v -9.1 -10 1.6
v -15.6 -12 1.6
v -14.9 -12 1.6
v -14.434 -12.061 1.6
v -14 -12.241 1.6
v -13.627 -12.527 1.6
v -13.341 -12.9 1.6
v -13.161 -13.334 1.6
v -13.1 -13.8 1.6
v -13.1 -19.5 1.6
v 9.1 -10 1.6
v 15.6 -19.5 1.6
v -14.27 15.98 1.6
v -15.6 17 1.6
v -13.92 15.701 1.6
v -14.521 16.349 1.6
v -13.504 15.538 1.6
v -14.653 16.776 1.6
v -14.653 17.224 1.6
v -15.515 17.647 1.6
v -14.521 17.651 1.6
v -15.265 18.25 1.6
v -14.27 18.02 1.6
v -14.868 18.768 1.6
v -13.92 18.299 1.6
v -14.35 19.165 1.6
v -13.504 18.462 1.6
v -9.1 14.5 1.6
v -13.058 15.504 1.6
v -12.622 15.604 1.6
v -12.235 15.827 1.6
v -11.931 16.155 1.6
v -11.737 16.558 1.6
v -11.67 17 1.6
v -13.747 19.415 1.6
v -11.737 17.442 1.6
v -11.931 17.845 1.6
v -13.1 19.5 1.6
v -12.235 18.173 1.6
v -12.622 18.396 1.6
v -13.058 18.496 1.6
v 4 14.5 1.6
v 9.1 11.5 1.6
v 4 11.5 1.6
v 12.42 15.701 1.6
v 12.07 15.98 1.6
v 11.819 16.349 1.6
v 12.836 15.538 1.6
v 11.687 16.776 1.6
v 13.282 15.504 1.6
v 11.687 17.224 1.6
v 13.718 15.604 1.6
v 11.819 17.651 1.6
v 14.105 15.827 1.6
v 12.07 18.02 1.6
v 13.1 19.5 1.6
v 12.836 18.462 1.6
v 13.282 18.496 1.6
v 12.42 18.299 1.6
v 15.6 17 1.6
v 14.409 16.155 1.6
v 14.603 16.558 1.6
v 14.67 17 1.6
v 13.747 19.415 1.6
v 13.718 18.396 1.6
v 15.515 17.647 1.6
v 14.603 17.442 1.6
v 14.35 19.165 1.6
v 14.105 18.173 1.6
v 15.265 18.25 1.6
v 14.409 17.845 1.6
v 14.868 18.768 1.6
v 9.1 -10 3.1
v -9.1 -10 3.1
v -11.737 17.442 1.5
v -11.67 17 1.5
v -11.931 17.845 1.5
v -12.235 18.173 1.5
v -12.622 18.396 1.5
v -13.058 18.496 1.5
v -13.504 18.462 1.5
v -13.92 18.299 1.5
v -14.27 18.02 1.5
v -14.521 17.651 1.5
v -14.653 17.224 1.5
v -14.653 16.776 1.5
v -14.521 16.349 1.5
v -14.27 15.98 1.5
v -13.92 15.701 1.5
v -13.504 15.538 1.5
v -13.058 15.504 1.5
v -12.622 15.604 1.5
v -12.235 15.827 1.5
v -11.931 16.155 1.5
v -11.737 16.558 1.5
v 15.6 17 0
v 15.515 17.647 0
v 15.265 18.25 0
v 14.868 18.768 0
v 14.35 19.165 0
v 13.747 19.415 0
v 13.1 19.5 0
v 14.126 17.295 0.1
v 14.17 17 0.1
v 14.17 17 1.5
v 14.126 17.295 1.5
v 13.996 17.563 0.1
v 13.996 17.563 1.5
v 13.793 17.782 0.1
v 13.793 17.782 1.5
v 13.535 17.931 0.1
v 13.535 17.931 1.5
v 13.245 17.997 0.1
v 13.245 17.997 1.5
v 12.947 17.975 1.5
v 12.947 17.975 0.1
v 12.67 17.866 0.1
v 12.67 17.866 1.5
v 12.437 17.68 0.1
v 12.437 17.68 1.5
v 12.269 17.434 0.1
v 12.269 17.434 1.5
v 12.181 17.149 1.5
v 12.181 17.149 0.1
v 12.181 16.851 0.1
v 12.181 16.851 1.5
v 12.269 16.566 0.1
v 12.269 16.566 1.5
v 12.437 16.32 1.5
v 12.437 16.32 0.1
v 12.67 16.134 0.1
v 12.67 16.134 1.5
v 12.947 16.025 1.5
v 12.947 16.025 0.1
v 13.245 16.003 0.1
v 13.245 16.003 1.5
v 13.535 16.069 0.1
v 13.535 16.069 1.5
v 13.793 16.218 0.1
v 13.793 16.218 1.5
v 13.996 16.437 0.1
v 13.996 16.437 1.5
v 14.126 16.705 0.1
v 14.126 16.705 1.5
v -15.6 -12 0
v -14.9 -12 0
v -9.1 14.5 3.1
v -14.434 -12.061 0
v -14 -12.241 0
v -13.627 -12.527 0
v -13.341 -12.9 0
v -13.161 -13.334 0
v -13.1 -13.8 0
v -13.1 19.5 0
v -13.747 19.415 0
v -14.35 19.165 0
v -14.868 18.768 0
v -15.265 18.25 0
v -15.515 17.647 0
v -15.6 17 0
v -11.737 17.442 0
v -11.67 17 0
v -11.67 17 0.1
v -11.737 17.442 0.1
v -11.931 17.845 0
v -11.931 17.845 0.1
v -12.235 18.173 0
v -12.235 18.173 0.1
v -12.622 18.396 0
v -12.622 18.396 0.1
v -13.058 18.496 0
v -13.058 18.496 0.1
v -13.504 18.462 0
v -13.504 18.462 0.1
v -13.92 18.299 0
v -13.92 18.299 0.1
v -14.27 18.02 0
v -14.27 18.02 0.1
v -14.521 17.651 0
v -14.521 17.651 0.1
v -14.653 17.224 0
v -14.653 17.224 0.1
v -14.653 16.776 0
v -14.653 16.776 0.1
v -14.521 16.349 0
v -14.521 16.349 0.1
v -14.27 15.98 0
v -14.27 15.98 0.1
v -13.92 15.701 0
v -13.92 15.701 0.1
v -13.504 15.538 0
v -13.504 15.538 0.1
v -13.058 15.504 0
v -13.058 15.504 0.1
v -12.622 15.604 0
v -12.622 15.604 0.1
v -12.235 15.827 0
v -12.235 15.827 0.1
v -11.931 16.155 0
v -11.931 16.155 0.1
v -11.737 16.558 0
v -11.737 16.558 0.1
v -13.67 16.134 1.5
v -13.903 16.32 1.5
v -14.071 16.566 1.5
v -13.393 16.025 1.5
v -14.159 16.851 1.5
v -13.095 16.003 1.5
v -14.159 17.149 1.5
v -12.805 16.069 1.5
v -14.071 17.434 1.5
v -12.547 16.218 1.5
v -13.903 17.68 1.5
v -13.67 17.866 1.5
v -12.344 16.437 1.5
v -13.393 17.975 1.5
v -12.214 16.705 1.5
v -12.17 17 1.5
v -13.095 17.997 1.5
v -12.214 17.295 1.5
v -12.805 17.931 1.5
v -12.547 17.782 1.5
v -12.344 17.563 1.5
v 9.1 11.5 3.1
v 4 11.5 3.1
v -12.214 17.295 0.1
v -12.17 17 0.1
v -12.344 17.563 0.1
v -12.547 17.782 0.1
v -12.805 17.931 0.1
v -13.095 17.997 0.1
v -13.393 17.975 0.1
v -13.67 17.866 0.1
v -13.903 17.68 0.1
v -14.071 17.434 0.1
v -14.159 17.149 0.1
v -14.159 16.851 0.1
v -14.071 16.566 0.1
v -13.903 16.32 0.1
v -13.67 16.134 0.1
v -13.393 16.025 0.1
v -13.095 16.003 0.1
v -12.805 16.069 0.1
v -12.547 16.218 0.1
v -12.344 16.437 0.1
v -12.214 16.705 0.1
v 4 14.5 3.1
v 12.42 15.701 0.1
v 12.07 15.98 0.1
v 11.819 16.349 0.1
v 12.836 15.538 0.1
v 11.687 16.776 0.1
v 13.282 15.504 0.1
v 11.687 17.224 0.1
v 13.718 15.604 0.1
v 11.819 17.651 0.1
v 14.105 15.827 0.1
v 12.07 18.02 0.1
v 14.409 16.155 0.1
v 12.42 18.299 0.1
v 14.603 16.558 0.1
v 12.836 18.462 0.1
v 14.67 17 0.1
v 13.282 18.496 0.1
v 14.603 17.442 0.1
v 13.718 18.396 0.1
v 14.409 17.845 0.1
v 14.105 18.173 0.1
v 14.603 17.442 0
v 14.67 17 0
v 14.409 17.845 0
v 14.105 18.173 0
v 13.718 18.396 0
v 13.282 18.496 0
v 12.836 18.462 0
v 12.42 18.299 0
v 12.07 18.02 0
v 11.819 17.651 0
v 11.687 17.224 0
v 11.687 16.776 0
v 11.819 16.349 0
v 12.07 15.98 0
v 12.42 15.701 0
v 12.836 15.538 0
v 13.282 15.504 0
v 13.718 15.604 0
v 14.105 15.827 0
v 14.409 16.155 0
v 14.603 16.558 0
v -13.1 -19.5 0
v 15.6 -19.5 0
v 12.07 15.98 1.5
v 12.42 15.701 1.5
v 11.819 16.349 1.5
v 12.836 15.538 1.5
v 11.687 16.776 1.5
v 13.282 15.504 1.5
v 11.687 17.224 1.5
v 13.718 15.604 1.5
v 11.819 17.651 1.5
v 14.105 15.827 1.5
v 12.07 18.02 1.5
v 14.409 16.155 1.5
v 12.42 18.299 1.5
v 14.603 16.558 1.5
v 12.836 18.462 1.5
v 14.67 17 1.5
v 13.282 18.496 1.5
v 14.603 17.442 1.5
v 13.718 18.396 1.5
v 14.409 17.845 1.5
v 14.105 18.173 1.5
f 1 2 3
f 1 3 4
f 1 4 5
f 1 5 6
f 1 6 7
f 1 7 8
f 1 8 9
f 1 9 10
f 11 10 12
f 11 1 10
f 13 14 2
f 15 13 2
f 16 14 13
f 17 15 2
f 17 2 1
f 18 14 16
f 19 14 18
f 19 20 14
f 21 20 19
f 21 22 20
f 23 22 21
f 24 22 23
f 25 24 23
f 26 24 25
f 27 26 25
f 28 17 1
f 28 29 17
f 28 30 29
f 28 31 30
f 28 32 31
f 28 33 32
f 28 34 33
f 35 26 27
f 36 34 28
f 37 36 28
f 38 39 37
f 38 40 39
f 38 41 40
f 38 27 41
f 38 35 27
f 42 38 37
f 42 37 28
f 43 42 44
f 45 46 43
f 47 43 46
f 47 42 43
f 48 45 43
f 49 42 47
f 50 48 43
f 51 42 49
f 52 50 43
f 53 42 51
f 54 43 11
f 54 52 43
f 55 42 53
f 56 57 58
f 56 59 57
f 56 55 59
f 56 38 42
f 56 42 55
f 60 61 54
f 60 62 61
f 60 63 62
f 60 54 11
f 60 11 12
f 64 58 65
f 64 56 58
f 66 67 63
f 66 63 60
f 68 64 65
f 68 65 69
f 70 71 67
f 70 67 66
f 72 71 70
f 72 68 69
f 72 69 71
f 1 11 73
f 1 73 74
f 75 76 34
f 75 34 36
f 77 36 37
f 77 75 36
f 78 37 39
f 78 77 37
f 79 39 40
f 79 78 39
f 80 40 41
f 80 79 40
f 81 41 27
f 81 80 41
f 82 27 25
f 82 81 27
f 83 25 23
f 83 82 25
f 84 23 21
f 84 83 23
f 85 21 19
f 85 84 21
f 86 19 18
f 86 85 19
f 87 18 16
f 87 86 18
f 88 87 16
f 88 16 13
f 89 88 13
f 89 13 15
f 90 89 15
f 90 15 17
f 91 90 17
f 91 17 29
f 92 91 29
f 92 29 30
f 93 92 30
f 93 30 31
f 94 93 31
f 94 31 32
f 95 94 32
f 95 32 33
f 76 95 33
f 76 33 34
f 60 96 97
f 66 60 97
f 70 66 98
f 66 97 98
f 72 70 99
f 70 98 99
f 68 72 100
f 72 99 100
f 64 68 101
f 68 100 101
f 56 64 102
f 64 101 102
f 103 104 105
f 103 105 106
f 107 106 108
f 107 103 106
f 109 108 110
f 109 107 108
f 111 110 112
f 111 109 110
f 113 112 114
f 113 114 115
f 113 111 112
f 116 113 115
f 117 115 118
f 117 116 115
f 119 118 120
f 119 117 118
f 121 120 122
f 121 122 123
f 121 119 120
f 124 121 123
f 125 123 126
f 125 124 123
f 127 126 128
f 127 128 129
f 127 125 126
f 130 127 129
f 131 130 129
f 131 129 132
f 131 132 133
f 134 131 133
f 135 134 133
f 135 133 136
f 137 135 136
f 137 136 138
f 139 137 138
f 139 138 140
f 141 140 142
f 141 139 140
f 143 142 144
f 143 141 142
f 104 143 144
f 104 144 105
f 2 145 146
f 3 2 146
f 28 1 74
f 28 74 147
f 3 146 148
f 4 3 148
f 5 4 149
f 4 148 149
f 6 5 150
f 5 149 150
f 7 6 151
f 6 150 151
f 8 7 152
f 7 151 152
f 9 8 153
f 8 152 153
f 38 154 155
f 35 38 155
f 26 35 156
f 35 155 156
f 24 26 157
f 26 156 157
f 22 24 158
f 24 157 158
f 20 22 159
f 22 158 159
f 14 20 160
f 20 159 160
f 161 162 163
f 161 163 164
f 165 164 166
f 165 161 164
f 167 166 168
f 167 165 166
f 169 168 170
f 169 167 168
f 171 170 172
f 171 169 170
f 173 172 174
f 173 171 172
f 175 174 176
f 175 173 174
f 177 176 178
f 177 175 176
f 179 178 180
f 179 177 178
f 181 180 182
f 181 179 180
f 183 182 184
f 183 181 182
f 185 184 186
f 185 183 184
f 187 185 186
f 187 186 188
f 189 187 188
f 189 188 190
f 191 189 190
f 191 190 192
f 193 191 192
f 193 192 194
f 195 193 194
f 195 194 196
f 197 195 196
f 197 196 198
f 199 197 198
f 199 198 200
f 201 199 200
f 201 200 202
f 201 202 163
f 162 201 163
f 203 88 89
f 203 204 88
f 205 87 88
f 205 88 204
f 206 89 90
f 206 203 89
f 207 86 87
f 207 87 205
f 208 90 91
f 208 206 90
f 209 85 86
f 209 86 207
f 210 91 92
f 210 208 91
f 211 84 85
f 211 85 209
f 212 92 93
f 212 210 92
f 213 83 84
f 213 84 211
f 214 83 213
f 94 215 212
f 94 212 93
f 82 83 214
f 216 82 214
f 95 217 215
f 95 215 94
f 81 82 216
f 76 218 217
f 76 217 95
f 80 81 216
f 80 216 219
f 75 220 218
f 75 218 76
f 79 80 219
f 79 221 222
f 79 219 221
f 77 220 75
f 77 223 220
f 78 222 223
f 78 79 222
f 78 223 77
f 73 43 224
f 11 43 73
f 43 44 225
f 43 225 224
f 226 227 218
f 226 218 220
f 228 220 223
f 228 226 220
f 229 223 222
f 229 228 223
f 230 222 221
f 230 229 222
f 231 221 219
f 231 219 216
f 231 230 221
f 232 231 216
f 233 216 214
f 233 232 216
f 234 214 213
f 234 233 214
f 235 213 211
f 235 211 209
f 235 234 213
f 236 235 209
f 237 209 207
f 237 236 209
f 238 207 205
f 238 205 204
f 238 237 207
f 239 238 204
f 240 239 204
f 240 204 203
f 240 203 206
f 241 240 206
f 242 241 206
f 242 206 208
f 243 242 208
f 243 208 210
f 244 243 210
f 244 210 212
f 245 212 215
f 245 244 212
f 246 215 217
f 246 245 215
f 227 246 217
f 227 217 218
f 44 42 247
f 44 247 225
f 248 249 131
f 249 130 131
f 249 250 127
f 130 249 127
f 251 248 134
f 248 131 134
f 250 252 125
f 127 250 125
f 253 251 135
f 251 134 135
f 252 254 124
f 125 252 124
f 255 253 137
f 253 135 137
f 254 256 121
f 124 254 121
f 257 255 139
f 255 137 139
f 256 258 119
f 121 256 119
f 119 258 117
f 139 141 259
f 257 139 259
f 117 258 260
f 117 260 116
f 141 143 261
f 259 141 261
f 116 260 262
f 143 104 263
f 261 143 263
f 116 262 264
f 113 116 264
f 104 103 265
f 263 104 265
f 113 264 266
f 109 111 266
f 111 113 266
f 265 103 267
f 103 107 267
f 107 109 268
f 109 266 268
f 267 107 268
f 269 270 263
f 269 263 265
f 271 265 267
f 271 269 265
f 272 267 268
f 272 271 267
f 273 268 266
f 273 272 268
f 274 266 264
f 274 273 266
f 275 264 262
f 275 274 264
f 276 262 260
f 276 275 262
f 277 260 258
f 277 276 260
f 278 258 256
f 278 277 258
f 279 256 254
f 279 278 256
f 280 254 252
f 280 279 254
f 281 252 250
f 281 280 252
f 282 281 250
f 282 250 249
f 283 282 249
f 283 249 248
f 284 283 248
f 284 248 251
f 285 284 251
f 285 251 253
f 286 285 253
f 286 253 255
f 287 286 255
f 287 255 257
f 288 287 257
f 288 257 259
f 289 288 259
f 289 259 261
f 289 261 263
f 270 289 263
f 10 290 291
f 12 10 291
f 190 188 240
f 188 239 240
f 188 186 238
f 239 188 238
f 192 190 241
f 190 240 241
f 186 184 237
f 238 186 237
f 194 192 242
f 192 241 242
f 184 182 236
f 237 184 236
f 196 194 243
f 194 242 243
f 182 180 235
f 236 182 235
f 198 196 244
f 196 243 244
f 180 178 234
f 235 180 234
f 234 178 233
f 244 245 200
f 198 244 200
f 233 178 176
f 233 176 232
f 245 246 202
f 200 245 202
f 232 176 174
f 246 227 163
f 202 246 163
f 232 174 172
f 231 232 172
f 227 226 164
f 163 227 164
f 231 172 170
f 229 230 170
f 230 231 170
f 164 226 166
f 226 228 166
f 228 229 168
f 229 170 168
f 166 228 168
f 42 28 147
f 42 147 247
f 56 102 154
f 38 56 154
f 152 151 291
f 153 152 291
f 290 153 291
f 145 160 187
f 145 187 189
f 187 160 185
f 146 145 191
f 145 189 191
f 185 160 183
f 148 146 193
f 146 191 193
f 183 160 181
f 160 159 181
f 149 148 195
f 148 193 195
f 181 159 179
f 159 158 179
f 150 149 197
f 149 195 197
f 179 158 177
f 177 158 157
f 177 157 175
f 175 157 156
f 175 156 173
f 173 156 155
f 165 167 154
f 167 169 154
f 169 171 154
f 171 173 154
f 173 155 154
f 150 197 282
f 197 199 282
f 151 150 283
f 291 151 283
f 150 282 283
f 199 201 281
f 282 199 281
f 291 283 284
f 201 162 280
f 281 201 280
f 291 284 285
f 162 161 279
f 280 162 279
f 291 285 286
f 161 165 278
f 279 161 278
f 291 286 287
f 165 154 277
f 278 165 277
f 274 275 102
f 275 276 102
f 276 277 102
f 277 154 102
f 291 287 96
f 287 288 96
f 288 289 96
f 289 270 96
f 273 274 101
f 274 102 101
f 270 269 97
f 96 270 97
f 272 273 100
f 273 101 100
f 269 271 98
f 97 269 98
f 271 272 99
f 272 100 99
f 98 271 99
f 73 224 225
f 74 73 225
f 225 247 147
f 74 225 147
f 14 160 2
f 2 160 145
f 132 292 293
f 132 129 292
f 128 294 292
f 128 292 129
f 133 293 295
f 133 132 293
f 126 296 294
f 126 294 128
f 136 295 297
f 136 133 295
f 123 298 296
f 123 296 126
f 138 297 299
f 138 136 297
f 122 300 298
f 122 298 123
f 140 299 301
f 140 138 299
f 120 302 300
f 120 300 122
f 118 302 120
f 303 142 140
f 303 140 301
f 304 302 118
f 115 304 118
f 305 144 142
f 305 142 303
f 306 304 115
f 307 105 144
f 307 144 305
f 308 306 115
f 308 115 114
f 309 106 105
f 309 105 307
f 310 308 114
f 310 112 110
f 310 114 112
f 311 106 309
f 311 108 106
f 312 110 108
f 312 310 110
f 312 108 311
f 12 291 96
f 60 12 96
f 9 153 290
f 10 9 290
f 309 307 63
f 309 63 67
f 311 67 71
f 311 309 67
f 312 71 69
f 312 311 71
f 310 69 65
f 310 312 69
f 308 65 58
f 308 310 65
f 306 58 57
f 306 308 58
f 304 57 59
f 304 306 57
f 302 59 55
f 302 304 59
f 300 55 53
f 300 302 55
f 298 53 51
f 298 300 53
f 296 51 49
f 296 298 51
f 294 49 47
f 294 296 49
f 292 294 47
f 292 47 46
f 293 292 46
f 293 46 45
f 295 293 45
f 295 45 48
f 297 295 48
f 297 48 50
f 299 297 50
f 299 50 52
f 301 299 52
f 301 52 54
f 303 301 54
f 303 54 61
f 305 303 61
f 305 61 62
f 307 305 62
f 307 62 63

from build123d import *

# Parameters (mm, degrees)
SKETCH1_R           = 1.5
BOSS_EXTRUDE1_DEPTH = 1.6
BOSS_EXTRUDE2_START = 0.1
SKETCH1_5_R         = 1.5
SKETCH1_5_R_2       = 1
BOSS_EXTRUDE2_DEPTH = 1.4
BOSS_EXTRUDE3_DEPTH = 1.5


with BuildPart() as part:
    # Sketch1 → Boss-Extrude1 (new body)
    with BuildSketch(Plane.XY):
        with BuildLine():
            Line((-15.6, 17), (-15.6, -12))
            Line((-15.6, -12), (-14.9, -12))
            ThreePointArc((-14.9, -12), (-13.627207794, -12.527207794), (-13.1, -13.8))
            Line((-13.1, -13.8), (-13.1, -19.5))
            Line((-13.1, -19.5), (15.6, -19.5))
            Line((15.6, -19.5), (15.6, 17))
            ThreePointArc((15.6, 17), (14.867766953, 18.767766953), (13.1, 19.5))
            Line((13.1, 19.5), (-13.1, 19.5))
            ThreePointArc((-13.1, 19.5), (-14.867766953, 18.767766953), (-15.6, 17))
        make_face()
        with Locations((-13.17, 17)):
            Circle(SKETCH1_R, mode=Mode.SUBTRACT)
        with Locations((13.17, 17)):
            Circle(SKETCH1_R, mode=Mode.SUBTRACT)
    extrude(amount=BOSS_EXTRUDE1_DEPTH)

    # Sketch1<5> → Boss-Extrude2 (add)
    with BuildSketch(Plane.XY.offset(BOSS_EXTRUDE2_START)):
        with Locations((13.17, 17)):
            Circle(SKETCH1_5_R)
        with Locations((13.17, 17)):
            Circle(SKETCH1_5_R_2, mode=Mode.SUBTRACT)
        with Locations((-13.17, 17)):
            Circle(SKETCH1_5_R)
        with Locations((-13.17, 17)):
            Circle(SKETCH1_5_R_2, mode=Mode.SUBTRACT)
    extrude(amount=BOSS_EXTRUDE2_DEPTH)

    # Sketch2 → Boss-Extrude3 (add)
    with BuildSketch(Plane.XY.offset(1.6)):
        Polygon((-9.1, 14.5), (4, 14.5), (4, 11.5), (9.1, 11.5), (9.1, -10), (-9.1, -10), align=None)
    extrude(amount=BOSS_EXTRUDE3_DEPTH)


solid = part.part
